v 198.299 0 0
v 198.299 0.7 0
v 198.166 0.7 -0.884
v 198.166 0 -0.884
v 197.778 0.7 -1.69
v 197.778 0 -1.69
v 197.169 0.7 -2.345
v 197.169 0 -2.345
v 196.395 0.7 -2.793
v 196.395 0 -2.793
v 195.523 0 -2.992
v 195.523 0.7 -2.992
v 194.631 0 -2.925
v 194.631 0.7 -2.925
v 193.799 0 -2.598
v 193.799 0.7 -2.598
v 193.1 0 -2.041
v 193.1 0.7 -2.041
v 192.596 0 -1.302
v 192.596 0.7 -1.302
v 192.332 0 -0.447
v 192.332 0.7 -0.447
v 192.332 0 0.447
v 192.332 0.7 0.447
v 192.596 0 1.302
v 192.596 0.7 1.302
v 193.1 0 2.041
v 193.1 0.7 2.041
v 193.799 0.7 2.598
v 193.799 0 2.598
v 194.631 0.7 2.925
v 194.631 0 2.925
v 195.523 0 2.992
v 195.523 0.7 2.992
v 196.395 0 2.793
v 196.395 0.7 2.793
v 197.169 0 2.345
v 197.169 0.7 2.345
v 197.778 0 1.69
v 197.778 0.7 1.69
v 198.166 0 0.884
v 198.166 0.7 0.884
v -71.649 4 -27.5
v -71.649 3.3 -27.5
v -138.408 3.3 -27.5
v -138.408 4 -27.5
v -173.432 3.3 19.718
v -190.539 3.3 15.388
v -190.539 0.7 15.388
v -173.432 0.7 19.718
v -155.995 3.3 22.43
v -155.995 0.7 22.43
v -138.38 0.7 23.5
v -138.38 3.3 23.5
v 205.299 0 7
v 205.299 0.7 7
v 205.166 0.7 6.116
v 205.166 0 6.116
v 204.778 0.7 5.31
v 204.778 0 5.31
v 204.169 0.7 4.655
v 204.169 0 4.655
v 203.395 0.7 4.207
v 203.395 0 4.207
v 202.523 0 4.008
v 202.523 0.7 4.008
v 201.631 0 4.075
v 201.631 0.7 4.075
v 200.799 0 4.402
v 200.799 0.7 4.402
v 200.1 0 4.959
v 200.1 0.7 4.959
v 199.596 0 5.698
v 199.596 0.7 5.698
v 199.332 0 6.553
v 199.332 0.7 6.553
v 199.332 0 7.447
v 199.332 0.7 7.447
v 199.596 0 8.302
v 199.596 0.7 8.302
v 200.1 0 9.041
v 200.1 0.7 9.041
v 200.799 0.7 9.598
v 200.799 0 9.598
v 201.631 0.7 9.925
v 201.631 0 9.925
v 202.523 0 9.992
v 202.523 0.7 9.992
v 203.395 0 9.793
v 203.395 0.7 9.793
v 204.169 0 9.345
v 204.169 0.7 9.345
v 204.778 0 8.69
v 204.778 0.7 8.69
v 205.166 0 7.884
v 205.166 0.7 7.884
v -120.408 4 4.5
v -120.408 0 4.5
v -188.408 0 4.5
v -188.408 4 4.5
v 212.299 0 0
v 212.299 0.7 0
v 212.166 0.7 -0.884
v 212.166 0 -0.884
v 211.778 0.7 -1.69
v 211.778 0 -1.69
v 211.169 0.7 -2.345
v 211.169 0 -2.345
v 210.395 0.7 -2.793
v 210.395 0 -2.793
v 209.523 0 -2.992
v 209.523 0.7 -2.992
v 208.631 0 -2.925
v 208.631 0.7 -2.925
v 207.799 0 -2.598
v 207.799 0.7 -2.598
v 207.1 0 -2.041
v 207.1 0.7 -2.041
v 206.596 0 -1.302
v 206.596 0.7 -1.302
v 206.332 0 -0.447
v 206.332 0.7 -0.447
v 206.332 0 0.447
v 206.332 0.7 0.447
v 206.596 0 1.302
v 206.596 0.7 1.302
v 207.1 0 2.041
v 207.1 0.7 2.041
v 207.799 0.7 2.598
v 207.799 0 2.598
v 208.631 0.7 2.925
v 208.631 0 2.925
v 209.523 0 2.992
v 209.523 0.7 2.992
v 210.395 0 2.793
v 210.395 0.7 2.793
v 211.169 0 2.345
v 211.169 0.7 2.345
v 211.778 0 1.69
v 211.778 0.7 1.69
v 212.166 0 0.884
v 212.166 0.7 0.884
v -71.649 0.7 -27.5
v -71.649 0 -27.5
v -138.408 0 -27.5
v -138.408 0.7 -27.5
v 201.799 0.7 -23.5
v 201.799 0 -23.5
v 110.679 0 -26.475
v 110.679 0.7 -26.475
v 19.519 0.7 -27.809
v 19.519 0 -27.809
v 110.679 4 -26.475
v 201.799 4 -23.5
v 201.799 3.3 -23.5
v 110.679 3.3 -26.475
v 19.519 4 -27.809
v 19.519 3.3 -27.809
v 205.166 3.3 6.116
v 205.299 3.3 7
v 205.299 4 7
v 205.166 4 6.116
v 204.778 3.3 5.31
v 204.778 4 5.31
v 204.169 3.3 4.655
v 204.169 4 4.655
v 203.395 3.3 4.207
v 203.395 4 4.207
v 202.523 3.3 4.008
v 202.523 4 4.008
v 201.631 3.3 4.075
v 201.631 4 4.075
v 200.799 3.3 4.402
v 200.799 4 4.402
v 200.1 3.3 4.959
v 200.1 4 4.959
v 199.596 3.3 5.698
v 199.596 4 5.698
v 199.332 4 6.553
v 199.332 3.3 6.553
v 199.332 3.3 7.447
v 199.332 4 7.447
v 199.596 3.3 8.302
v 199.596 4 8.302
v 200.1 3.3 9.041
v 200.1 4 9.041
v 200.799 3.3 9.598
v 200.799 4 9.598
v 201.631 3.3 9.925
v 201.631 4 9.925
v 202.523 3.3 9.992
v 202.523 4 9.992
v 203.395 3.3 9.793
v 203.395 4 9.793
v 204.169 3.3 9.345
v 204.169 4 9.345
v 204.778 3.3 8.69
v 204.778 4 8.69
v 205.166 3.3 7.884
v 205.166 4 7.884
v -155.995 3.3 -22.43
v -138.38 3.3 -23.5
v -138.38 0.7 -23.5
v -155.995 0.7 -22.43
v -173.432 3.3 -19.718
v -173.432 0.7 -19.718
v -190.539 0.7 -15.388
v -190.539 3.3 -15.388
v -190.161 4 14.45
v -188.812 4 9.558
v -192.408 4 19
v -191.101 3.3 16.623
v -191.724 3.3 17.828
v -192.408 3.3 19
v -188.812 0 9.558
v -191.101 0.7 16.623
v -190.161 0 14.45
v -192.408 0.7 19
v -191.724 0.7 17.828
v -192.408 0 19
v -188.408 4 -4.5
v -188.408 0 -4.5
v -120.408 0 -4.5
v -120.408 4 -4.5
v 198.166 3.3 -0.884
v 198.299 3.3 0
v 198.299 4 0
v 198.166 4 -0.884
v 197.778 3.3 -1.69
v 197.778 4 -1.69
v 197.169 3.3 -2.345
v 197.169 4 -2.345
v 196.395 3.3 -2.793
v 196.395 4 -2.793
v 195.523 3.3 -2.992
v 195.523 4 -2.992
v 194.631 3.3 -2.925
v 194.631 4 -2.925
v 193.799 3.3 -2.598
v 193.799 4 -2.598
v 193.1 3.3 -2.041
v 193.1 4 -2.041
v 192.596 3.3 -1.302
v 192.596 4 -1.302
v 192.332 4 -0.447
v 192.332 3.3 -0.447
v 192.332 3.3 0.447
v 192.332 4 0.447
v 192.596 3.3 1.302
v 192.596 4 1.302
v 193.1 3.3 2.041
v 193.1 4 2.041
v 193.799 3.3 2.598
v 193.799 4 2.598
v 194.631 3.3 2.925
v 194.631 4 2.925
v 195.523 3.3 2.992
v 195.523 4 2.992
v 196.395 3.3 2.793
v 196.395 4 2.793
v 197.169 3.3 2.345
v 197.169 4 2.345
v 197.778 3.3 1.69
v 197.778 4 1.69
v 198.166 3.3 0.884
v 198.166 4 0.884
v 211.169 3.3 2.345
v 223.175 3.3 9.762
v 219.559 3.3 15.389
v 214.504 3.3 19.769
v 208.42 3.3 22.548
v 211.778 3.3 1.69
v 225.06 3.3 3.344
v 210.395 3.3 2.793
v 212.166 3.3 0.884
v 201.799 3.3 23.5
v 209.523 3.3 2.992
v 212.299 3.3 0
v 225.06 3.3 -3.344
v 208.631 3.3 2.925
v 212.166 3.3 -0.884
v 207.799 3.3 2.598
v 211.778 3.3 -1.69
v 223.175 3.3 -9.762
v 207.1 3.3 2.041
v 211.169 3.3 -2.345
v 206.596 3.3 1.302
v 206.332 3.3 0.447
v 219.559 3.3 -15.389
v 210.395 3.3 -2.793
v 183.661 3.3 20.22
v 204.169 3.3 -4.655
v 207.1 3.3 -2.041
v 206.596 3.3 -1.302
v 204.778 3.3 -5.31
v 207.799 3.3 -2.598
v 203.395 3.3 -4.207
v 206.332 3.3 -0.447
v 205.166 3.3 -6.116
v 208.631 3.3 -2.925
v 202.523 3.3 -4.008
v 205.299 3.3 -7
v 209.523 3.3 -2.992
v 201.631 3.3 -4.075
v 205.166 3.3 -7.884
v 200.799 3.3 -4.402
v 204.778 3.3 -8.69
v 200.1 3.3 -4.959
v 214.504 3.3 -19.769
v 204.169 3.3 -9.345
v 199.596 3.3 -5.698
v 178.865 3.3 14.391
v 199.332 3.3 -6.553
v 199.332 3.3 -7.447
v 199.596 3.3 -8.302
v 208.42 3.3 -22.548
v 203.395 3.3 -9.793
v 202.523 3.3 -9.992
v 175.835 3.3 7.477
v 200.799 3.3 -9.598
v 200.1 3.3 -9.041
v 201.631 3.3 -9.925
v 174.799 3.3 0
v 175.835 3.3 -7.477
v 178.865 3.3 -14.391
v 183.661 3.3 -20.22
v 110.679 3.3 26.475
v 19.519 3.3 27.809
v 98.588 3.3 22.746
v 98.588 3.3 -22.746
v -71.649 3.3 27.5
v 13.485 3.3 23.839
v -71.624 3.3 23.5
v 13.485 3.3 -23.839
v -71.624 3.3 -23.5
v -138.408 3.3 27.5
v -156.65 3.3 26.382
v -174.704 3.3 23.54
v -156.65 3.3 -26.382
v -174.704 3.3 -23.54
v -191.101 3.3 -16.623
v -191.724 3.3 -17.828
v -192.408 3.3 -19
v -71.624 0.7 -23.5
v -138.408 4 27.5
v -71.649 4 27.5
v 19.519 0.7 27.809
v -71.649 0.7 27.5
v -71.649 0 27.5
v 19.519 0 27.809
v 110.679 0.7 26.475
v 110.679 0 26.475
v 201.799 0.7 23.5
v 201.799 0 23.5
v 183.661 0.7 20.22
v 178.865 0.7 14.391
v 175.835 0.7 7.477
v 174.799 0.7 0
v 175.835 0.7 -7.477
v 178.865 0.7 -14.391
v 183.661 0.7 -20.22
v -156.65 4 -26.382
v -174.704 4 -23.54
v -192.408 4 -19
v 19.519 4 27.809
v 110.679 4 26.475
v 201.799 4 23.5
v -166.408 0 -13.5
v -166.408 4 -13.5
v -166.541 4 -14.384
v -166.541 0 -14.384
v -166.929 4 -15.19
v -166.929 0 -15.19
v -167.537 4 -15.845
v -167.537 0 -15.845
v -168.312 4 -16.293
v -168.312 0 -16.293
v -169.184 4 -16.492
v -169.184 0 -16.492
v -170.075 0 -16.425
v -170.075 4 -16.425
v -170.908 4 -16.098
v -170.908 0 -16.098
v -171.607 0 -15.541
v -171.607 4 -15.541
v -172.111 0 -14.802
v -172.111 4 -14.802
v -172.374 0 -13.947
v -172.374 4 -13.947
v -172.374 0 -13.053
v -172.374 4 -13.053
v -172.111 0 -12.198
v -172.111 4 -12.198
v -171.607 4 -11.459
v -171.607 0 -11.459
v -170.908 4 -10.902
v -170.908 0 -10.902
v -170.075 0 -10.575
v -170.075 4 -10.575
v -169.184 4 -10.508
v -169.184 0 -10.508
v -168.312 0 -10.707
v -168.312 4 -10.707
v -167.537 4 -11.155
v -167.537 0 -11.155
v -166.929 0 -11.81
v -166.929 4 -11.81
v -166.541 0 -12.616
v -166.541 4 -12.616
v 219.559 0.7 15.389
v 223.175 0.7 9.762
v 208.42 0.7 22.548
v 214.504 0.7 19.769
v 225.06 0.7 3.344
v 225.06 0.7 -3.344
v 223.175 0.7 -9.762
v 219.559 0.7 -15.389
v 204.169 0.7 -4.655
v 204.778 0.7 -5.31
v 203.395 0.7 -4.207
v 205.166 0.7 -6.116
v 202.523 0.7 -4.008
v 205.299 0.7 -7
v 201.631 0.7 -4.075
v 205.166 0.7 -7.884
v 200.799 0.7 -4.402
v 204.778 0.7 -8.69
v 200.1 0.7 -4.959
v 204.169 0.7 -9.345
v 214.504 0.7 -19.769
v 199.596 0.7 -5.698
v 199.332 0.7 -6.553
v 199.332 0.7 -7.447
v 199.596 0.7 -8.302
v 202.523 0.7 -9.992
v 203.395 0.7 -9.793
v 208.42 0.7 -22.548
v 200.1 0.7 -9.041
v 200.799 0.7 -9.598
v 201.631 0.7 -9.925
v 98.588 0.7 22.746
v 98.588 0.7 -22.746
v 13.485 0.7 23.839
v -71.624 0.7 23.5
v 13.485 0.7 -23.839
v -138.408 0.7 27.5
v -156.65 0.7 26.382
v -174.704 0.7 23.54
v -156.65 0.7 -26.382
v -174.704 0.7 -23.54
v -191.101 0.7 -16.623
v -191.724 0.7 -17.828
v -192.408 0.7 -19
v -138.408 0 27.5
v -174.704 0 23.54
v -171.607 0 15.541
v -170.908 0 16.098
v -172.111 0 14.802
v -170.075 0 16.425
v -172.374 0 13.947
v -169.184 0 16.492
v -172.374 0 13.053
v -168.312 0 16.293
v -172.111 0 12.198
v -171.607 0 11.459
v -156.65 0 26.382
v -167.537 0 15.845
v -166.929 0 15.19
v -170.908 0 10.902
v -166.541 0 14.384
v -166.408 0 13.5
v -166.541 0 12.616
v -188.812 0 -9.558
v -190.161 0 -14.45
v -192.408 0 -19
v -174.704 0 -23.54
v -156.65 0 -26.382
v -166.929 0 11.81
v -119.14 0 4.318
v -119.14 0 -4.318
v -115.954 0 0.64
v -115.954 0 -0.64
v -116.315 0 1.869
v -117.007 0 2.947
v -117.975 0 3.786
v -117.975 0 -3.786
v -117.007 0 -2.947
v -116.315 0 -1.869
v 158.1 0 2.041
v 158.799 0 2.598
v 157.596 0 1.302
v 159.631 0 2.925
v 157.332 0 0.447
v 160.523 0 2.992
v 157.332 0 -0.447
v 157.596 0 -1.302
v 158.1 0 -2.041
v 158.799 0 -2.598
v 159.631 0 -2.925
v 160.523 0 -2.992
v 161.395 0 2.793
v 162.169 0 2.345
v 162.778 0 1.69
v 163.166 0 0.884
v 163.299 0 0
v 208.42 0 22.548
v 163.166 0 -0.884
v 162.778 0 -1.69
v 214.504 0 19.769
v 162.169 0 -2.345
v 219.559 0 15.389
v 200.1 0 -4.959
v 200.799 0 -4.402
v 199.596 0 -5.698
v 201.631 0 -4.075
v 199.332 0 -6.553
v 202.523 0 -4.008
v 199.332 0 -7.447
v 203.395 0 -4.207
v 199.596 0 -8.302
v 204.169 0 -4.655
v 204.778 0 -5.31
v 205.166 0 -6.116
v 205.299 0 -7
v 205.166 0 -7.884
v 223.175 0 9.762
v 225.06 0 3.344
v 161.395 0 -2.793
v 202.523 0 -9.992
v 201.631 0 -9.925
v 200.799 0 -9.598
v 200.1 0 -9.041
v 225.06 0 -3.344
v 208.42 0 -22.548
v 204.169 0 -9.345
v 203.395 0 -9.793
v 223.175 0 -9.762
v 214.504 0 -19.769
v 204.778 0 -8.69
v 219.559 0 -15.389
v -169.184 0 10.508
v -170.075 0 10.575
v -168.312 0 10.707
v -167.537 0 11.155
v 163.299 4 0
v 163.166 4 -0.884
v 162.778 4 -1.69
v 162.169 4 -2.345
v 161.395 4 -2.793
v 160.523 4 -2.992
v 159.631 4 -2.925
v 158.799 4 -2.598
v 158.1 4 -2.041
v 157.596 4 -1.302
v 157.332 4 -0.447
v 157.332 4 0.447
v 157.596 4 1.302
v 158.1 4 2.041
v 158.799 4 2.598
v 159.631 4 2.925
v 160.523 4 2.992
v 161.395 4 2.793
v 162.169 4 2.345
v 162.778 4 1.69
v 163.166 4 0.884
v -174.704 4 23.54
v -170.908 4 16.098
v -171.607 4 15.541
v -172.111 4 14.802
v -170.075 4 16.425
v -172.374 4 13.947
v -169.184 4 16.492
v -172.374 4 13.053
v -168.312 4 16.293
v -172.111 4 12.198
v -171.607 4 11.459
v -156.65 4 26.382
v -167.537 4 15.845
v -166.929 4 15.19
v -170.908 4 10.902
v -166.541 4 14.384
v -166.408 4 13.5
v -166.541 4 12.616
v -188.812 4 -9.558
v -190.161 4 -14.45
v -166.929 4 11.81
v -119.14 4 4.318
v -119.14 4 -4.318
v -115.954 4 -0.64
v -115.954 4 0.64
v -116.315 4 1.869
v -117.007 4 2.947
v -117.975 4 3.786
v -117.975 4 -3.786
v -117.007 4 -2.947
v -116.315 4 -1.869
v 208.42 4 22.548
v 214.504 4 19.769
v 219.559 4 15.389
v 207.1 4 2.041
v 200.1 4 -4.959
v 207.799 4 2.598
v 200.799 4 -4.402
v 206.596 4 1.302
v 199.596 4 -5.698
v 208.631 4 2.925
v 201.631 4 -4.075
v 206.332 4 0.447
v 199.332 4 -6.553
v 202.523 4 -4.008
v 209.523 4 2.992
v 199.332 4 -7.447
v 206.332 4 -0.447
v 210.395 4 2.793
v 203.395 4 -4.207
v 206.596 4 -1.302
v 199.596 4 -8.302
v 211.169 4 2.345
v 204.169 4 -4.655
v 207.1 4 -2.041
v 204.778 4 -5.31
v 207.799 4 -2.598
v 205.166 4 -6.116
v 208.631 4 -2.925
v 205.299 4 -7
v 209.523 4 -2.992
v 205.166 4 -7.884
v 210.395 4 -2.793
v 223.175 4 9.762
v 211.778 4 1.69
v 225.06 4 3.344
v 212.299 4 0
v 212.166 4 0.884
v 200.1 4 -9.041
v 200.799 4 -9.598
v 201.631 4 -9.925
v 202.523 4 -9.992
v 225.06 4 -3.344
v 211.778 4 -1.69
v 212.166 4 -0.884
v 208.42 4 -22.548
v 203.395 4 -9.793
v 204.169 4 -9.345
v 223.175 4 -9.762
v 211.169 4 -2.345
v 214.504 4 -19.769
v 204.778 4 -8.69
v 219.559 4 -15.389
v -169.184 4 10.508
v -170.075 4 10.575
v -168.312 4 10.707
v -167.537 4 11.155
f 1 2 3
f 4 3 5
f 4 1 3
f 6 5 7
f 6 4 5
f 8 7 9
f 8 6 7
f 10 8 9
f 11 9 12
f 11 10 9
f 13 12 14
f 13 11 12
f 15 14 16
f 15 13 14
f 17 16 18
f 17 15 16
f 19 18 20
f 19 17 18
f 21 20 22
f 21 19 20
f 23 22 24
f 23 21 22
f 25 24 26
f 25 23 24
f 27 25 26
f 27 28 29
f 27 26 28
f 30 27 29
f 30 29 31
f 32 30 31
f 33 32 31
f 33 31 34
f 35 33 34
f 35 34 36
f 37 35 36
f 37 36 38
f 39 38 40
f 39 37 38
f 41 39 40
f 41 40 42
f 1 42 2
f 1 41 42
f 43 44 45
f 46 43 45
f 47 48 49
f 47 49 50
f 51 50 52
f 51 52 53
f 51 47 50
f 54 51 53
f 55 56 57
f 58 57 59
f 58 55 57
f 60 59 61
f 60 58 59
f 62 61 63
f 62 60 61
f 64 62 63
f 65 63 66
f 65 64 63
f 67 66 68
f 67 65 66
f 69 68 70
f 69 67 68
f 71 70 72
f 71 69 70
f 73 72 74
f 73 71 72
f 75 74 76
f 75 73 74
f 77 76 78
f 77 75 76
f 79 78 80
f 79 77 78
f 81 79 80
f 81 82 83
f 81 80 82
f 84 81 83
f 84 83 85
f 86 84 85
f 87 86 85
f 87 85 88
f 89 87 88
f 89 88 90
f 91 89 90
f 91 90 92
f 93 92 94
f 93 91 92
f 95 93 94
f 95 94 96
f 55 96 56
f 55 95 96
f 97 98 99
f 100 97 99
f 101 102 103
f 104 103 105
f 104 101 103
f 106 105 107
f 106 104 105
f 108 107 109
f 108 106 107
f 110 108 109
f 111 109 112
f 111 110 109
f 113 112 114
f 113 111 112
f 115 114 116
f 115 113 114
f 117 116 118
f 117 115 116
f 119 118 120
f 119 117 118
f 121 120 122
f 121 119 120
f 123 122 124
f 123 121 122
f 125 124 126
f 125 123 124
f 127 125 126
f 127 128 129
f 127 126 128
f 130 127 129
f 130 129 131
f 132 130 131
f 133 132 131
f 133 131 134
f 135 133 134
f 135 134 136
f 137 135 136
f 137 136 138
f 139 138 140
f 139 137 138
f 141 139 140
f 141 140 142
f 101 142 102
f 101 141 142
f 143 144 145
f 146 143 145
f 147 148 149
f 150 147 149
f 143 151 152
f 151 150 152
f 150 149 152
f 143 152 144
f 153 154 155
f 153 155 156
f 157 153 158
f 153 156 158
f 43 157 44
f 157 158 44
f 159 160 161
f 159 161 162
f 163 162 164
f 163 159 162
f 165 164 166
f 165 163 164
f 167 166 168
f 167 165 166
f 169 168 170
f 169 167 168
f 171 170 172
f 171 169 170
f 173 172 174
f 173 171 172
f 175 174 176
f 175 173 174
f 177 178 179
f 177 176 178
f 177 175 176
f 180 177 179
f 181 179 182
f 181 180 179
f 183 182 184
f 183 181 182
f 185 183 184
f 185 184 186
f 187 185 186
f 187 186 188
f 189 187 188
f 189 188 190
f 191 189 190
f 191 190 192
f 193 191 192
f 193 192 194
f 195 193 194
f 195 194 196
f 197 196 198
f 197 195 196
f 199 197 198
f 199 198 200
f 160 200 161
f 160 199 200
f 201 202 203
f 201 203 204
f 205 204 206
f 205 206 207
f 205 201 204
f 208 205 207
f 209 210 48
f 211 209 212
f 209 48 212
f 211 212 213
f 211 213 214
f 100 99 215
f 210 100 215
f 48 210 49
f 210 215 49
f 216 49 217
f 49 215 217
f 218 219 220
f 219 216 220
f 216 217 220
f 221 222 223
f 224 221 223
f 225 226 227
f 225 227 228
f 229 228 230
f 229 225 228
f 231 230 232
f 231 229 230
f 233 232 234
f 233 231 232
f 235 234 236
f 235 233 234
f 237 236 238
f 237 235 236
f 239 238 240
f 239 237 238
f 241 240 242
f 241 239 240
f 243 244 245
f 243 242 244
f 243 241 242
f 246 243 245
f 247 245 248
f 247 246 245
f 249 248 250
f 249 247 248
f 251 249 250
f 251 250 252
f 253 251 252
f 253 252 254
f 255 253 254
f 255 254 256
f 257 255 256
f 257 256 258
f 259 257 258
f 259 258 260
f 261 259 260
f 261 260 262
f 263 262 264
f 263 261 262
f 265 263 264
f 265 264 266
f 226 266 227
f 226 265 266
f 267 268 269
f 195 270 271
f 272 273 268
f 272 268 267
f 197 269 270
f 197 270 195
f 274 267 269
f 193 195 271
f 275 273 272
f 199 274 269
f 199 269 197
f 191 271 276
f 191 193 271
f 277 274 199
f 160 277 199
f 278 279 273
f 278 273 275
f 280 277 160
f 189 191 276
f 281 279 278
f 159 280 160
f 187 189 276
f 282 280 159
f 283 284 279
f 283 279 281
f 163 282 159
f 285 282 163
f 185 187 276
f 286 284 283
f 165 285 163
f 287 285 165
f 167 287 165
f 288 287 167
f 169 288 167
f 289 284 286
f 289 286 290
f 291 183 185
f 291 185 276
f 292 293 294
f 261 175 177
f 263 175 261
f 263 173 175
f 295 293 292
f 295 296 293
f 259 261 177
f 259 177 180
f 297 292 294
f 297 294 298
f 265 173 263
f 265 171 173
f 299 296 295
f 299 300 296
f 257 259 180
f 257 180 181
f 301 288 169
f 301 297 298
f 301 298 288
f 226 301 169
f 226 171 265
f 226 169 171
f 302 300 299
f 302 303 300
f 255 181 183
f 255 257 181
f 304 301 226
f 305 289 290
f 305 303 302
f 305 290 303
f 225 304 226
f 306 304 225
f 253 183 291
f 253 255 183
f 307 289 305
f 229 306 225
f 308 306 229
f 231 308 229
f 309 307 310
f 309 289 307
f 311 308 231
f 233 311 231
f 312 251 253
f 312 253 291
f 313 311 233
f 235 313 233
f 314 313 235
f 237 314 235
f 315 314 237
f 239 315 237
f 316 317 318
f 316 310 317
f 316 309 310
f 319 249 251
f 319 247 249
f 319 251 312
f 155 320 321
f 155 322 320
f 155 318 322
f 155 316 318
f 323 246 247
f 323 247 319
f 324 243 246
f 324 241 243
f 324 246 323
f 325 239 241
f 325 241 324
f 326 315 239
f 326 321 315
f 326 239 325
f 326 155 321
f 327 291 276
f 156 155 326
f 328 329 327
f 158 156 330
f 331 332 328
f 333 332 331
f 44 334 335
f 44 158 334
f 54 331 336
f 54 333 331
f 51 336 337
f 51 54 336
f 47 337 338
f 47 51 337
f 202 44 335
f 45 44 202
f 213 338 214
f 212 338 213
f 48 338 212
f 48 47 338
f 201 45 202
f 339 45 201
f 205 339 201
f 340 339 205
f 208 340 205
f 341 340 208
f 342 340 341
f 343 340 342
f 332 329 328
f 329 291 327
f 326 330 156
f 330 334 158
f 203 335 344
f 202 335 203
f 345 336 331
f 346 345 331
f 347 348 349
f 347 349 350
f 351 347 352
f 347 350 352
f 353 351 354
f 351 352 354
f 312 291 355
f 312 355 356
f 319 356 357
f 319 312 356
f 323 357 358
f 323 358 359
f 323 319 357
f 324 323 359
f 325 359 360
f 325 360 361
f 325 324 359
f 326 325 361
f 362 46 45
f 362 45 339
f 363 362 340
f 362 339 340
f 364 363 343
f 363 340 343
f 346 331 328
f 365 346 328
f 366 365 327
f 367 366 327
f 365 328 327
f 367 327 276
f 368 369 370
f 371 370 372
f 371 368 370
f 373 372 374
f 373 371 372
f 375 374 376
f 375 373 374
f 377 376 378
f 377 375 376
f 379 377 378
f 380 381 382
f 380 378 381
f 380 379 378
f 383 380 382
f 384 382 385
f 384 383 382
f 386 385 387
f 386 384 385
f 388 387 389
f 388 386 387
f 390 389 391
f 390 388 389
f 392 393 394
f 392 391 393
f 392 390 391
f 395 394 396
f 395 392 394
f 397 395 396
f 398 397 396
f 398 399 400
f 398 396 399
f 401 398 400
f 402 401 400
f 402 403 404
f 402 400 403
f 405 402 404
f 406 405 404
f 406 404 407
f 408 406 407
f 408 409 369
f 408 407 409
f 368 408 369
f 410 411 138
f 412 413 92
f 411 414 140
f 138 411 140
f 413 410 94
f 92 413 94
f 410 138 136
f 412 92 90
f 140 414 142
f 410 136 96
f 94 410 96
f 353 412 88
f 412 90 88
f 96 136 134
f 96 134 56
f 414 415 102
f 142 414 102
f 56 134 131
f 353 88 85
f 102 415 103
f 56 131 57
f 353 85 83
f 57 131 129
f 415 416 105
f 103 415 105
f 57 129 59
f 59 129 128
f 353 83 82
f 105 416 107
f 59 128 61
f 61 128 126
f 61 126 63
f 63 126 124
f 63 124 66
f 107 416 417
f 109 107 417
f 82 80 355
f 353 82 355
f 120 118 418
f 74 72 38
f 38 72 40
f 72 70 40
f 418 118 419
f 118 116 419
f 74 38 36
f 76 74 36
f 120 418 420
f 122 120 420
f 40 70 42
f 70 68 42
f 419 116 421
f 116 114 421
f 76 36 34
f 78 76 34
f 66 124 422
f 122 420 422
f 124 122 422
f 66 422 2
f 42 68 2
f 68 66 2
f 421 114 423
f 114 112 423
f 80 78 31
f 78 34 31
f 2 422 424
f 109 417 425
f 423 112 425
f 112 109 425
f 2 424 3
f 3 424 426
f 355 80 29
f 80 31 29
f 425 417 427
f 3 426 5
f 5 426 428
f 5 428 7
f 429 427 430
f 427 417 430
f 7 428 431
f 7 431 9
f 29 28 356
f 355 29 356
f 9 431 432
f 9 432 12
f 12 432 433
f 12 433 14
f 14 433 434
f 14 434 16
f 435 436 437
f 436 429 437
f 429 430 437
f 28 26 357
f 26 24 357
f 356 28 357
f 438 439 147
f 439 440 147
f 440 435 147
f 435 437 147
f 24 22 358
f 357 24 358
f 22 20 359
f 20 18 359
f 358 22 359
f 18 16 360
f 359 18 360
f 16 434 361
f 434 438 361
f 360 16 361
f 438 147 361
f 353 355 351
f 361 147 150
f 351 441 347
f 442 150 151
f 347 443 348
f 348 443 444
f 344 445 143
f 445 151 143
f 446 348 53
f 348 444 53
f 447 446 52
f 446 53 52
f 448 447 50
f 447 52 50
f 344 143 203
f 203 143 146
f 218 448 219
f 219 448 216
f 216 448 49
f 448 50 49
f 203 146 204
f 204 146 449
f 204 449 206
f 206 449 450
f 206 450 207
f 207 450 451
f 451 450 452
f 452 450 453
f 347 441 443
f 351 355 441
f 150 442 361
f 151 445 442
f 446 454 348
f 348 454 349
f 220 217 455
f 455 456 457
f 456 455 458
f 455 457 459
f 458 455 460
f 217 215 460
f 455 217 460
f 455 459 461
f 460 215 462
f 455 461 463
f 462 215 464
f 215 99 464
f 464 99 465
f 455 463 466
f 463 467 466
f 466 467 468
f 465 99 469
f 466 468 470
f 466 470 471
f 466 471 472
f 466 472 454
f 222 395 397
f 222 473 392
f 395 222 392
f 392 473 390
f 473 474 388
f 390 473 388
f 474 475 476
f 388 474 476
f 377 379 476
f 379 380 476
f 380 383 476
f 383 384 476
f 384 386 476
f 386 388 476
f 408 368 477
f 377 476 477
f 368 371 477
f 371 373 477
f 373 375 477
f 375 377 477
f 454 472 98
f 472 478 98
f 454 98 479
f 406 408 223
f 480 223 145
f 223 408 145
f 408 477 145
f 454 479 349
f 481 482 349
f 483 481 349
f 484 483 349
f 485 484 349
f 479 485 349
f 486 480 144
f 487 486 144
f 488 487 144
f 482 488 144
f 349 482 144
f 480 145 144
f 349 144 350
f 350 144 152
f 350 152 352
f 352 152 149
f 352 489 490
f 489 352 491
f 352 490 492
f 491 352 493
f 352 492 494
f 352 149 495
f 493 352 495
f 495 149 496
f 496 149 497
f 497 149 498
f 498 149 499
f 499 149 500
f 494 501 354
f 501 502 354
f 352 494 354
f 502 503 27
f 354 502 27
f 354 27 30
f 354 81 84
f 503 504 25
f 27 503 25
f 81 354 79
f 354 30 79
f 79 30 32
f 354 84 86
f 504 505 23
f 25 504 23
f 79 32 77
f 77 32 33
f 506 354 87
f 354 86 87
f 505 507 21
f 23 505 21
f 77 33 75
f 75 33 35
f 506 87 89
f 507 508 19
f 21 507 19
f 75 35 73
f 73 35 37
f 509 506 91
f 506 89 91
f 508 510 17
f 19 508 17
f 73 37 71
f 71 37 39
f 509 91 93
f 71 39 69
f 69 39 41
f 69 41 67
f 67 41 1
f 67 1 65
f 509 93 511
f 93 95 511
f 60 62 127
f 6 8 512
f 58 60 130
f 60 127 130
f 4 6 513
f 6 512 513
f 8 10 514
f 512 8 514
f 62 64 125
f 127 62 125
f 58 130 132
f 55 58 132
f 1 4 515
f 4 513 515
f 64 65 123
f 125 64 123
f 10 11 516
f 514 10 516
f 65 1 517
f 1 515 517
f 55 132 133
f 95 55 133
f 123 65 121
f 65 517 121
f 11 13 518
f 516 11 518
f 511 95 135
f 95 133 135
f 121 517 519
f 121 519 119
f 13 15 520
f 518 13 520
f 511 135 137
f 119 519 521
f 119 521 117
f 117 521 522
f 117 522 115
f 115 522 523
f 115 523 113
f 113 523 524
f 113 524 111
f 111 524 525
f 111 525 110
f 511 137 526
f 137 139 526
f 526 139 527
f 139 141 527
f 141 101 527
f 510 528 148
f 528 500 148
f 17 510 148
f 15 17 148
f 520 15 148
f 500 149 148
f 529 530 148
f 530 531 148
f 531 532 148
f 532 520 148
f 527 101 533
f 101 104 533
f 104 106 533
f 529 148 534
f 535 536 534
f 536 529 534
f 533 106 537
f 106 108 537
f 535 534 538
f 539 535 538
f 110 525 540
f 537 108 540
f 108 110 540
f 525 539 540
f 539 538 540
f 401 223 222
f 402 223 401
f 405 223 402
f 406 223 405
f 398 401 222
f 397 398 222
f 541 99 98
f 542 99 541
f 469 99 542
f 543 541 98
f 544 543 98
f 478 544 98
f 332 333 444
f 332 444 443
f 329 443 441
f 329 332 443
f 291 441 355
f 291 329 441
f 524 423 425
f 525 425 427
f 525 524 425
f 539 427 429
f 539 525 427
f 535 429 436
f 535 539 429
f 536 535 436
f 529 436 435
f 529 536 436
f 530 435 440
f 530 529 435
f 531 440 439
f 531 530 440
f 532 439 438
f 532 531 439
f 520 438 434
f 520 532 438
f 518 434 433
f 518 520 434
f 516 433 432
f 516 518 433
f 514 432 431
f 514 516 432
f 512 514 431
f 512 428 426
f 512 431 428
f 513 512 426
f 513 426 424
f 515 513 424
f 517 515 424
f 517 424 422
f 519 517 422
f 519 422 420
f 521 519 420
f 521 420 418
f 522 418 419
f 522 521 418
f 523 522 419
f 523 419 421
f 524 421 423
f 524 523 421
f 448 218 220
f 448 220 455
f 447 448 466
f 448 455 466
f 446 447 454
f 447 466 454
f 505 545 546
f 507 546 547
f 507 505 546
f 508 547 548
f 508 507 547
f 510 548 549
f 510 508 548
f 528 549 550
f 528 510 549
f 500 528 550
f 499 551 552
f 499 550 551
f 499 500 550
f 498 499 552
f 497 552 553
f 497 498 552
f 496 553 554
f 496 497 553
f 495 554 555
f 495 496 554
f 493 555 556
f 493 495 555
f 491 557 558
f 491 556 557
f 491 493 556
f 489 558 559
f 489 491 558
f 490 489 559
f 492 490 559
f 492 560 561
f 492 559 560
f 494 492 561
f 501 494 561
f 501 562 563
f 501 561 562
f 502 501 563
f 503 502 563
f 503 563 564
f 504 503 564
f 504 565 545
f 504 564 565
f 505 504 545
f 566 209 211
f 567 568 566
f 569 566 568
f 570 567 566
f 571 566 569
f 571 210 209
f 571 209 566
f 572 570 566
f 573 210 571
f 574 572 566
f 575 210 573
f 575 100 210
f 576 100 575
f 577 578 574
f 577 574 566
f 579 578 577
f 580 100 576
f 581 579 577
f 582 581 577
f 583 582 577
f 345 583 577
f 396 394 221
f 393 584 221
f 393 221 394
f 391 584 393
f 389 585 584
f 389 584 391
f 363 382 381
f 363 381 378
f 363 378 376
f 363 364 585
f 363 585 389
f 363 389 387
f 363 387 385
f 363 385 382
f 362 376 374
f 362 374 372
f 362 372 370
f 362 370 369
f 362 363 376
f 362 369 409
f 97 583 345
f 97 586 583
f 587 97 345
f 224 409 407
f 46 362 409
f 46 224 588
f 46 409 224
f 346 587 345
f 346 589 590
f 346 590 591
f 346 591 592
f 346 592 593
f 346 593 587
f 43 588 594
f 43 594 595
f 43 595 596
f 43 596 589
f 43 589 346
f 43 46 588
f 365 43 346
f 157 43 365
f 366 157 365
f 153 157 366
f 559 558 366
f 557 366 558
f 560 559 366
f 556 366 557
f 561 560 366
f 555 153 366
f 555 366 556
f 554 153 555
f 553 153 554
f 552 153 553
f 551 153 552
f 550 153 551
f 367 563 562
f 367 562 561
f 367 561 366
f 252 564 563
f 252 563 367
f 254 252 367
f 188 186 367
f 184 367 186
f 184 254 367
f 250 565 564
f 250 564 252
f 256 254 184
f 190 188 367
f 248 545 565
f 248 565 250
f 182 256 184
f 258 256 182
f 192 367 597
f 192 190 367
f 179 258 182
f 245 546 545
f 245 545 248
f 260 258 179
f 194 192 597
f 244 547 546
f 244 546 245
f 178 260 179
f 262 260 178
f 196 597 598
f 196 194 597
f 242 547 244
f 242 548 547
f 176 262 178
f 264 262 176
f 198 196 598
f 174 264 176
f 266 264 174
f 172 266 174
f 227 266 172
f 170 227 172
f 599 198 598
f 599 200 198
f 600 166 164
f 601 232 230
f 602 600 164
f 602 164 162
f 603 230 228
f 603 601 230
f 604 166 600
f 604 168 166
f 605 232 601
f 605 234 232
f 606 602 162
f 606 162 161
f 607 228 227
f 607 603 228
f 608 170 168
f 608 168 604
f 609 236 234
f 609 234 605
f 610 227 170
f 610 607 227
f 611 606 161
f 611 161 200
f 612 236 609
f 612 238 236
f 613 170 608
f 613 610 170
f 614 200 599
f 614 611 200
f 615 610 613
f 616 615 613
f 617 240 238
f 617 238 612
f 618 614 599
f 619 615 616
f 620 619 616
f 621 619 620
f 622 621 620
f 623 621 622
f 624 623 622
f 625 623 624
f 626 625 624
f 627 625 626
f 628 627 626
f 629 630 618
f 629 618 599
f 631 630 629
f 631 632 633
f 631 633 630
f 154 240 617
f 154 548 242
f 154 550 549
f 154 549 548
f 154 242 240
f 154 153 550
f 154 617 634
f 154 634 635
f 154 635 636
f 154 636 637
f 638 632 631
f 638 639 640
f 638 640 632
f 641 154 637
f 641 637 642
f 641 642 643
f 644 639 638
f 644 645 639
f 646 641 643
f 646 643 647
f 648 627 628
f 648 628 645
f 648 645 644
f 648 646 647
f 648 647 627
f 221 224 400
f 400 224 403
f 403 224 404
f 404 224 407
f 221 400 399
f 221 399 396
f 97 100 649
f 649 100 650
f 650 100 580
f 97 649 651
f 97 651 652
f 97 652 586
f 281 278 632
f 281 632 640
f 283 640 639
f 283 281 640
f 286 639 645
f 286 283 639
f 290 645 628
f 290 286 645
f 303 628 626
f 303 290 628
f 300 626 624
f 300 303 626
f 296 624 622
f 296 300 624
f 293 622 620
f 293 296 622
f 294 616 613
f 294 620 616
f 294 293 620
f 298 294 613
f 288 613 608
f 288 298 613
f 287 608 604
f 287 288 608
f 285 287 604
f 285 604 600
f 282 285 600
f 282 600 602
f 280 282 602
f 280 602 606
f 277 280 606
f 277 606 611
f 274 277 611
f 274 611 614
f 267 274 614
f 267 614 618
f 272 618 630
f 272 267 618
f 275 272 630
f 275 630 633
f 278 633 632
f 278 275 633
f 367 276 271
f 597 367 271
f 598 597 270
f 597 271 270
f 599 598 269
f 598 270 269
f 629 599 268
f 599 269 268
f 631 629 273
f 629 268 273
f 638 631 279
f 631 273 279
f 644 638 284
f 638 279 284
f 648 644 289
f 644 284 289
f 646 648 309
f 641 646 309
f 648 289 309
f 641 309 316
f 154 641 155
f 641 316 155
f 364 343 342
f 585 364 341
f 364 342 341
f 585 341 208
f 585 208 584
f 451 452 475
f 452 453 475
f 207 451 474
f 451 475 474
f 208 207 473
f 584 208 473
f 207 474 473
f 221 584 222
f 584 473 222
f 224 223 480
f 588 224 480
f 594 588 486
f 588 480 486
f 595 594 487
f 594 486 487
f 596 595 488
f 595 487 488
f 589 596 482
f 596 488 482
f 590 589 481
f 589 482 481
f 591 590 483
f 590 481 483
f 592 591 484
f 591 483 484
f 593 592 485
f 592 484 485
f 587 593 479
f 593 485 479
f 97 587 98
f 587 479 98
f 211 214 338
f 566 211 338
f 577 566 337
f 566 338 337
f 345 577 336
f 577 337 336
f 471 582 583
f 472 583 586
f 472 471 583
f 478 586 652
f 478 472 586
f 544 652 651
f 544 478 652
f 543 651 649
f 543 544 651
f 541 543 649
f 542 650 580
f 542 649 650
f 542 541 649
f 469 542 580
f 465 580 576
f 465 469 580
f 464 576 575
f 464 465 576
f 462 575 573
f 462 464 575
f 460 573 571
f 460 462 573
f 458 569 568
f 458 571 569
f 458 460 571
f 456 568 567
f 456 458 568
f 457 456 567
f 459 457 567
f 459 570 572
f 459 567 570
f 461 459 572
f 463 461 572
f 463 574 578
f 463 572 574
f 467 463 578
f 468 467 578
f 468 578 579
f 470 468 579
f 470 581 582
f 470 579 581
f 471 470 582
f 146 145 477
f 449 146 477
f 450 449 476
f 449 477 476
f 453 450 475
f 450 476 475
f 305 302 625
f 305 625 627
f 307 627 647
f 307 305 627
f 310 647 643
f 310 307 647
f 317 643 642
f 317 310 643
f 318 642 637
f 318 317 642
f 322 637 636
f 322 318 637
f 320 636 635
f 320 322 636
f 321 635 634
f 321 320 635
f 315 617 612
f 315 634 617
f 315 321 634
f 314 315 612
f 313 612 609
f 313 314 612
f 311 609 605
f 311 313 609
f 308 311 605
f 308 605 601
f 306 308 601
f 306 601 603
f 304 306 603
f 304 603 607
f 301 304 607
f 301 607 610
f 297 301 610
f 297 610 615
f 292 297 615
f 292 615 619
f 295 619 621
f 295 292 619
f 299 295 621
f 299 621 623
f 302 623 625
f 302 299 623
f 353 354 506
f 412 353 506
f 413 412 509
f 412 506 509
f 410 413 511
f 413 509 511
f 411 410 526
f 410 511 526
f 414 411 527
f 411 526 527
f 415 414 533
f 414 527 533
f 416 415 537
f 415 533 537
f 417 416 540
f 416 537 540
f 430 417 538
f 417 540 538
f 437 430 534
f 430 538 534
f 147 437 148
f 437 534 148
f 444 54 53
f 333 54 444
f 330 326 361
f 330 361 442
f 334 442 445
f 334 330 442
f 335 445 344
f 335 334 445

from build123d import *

# Parameters (mm, degrees)
BOSS_EXTRUDE2_DEPTH     = 4
SKETCH1_5_R             = 3
CUT_EXTRUDE3_DEPTH      = 54
SKETCH1_6_R             = 3
CUT_EXTRUDE4_DEPTH      = 35
CUT_EXTRUDE6_DEPTH      = 1.3
CUT_EXTRUDE6_DEPTH_BACK = 1.3


with BuildPart() as part:
    # Sketch1 → Boss-Extrude2 (new body)
    with BuildSketch(Plane(origin=(0, 0, 0), x_dir=(1, 0, 0), z_dir=(0, 1, 0))):
        with BuildLine():
            Line((-71.648984849, 27.5), (-138.40789612, 27.5))
            ThreePointArc((-138.40789612, 27.5), (-165.710949902, 25.175282852), (-192.40789612, 19))
            ThreePointArc((-192.40789612, 19), (-189.370573735, 12.036157899), (-188.40789612, 4.5))
            Line((-188.40789612, 4.5), (-120.40789612, 4.5))
            ThreePointArc((-120.40789612, 4.5), (-115.90789612, 0), (-120.40789612, -4.5))
            Line((-120.40789612, -4.5), (-188.40789612, -4.5))
            ThreePointArc((-188.40789612, -4.5), (-189.370573735, -12.036157899), (-192.40789612, -19))
            ThreePointArc((-192.40789612, -19), (-165.710949902, -25.175282852), (-138.40789612, -27.5))
            Line((-138.40789612, -27.5), (-71.648984849, -27.5))
            ThreePointArc((-71.648984849, -27.5), (65.101994969, -27.347428228), (201.798926373, -23.5))
            ThreePointArc((201.798926373, -23.5), (225.298926373, 0), (201.798926373, 23.5))
            ThreePointArc((201.798926373, 23.5), (65.101994969, 27.347428228), (-71.648984849, 27.5))
        make_face()
    extrude(amount=BOSS_EXTRUDE2_DEPTH)

    # Sketch1<5> → Cut-Extrude3 (cut)
    with BuildSketch(Plane(origin=(0, 0, 0), x_dir=(1, 0, 0), z_dir=(0, 1, 0))):
        with Locations((160.298926373, 0)):
            Circle(SKETCH1_5_R)
        with Locations((195.298926373, 0)):
            Circle(SKETCH1_5_R)
        with Locations((202.298926373, 7)):
            Circle(SKETCH1_5_R)
        with Locations((209.298926373, 0)):
            Circle(SKETCH1_5_R)
        with Locations((202.298926373, -7)):
            Circle(SKETCH1_5_R)
        with Locations((-169.40789612, -13.5)):
            Circle(SKETCH1_5_R)
    extrude(amount=CUT_EXTRUDE3_DEPTH, mode=Mode.SUBTRACT)

    # Sketch1<6> → Cut-Extrude4 (cut)
    with BuildSketch(Plane(origin=(0, 0, 0), x_dir=(1, 0, 0), z_dir=(0, 1, 0))):
        with Locations((-169.40789612, 13.5)):
            Circle(SKETCH1_6_R)
    extrude(amount=CUT_EXTRUDE4_DEPTH, mode=Mode.SUBTRACT)

    # Sketch11 → Cut-Extrude6 (cut, two sides: drawn at the far end of the back side and taken through both)
    with BuildSketch(Plane(origin=(0, 2, 0), x_dir=(1, 0, 0), z_dir=(0, 1, 0)).offset(-CUT_EXTRUDE6_DEPTH_BACK)):
        with BuildLine():
            Line((-138.380243773, -23.5), (-71.624188449, -23.5))
            ThreePointArc((-71.624188449, -23.5), (56.038931481, -23.471555382), (183.66064985, -20.220401783))
            ThreePointArc((183.66064985, -20.220401783), (174.798926373, 0), (183.66064985, 20.220401783))
            ThreePointArc((183.66064985, 20.220401783), (56.038931481, 23.471555382), (-71.624188449, 23.5))
            Line((-71.624188449, 23.5), (-138.380243773, 23.5))
            ThreePointArc((-138.380243773, 23.5), (-164.744814342, 21.277783148), (-190.539098376, 15.388492851))
            ThreePointArc((-190.539098376, 15.388492851), (-191.404952918, 17.229715133), (-192.40789612, 19))
            ThreePointArc((-192.40789612, 19), (-165.710949902, 25.175282852), (-138.40789612, 27.5))
            Line((-138.40789612, 27.5), (-71.648984849, 27.5))
            ThreePointArc((-71.648984849, 27.5), (65.101994969, 27.347428228), (201.798926373, 23.5))
            ThreePointArc((201.798926373, 23.5), (225.298926373, 0), (201.798926373, -23.5))
            ThreePointArc((201.798926373, -23.5), (65.101994969, -27.347428228), (-71.648984849, -27.5))
            Line((-71.648984849, -27.5), (-138.40789612, -27.5))
            ThreePointArc((-138.40789612, -27.5), (-165.710949902, -25.175282852), (-192.40789612, -19))
            ThreePointArc((-192.40789612, -19), (-191.404952918, -17.229715133), (-190.539098376, -15.388492851))
            ThreePointArc((-190.539098376, -15.388492851), (-164.744814342, -21.277783148), (-138.380243773, -23.5))
        make_face()
    extrude(amount=CUT_EXTRUDE6_DEPTH + CUT_EXTRUDE6_DEPTH_BACK, mode=Mode.SUBTRACT)


solid = part.part
